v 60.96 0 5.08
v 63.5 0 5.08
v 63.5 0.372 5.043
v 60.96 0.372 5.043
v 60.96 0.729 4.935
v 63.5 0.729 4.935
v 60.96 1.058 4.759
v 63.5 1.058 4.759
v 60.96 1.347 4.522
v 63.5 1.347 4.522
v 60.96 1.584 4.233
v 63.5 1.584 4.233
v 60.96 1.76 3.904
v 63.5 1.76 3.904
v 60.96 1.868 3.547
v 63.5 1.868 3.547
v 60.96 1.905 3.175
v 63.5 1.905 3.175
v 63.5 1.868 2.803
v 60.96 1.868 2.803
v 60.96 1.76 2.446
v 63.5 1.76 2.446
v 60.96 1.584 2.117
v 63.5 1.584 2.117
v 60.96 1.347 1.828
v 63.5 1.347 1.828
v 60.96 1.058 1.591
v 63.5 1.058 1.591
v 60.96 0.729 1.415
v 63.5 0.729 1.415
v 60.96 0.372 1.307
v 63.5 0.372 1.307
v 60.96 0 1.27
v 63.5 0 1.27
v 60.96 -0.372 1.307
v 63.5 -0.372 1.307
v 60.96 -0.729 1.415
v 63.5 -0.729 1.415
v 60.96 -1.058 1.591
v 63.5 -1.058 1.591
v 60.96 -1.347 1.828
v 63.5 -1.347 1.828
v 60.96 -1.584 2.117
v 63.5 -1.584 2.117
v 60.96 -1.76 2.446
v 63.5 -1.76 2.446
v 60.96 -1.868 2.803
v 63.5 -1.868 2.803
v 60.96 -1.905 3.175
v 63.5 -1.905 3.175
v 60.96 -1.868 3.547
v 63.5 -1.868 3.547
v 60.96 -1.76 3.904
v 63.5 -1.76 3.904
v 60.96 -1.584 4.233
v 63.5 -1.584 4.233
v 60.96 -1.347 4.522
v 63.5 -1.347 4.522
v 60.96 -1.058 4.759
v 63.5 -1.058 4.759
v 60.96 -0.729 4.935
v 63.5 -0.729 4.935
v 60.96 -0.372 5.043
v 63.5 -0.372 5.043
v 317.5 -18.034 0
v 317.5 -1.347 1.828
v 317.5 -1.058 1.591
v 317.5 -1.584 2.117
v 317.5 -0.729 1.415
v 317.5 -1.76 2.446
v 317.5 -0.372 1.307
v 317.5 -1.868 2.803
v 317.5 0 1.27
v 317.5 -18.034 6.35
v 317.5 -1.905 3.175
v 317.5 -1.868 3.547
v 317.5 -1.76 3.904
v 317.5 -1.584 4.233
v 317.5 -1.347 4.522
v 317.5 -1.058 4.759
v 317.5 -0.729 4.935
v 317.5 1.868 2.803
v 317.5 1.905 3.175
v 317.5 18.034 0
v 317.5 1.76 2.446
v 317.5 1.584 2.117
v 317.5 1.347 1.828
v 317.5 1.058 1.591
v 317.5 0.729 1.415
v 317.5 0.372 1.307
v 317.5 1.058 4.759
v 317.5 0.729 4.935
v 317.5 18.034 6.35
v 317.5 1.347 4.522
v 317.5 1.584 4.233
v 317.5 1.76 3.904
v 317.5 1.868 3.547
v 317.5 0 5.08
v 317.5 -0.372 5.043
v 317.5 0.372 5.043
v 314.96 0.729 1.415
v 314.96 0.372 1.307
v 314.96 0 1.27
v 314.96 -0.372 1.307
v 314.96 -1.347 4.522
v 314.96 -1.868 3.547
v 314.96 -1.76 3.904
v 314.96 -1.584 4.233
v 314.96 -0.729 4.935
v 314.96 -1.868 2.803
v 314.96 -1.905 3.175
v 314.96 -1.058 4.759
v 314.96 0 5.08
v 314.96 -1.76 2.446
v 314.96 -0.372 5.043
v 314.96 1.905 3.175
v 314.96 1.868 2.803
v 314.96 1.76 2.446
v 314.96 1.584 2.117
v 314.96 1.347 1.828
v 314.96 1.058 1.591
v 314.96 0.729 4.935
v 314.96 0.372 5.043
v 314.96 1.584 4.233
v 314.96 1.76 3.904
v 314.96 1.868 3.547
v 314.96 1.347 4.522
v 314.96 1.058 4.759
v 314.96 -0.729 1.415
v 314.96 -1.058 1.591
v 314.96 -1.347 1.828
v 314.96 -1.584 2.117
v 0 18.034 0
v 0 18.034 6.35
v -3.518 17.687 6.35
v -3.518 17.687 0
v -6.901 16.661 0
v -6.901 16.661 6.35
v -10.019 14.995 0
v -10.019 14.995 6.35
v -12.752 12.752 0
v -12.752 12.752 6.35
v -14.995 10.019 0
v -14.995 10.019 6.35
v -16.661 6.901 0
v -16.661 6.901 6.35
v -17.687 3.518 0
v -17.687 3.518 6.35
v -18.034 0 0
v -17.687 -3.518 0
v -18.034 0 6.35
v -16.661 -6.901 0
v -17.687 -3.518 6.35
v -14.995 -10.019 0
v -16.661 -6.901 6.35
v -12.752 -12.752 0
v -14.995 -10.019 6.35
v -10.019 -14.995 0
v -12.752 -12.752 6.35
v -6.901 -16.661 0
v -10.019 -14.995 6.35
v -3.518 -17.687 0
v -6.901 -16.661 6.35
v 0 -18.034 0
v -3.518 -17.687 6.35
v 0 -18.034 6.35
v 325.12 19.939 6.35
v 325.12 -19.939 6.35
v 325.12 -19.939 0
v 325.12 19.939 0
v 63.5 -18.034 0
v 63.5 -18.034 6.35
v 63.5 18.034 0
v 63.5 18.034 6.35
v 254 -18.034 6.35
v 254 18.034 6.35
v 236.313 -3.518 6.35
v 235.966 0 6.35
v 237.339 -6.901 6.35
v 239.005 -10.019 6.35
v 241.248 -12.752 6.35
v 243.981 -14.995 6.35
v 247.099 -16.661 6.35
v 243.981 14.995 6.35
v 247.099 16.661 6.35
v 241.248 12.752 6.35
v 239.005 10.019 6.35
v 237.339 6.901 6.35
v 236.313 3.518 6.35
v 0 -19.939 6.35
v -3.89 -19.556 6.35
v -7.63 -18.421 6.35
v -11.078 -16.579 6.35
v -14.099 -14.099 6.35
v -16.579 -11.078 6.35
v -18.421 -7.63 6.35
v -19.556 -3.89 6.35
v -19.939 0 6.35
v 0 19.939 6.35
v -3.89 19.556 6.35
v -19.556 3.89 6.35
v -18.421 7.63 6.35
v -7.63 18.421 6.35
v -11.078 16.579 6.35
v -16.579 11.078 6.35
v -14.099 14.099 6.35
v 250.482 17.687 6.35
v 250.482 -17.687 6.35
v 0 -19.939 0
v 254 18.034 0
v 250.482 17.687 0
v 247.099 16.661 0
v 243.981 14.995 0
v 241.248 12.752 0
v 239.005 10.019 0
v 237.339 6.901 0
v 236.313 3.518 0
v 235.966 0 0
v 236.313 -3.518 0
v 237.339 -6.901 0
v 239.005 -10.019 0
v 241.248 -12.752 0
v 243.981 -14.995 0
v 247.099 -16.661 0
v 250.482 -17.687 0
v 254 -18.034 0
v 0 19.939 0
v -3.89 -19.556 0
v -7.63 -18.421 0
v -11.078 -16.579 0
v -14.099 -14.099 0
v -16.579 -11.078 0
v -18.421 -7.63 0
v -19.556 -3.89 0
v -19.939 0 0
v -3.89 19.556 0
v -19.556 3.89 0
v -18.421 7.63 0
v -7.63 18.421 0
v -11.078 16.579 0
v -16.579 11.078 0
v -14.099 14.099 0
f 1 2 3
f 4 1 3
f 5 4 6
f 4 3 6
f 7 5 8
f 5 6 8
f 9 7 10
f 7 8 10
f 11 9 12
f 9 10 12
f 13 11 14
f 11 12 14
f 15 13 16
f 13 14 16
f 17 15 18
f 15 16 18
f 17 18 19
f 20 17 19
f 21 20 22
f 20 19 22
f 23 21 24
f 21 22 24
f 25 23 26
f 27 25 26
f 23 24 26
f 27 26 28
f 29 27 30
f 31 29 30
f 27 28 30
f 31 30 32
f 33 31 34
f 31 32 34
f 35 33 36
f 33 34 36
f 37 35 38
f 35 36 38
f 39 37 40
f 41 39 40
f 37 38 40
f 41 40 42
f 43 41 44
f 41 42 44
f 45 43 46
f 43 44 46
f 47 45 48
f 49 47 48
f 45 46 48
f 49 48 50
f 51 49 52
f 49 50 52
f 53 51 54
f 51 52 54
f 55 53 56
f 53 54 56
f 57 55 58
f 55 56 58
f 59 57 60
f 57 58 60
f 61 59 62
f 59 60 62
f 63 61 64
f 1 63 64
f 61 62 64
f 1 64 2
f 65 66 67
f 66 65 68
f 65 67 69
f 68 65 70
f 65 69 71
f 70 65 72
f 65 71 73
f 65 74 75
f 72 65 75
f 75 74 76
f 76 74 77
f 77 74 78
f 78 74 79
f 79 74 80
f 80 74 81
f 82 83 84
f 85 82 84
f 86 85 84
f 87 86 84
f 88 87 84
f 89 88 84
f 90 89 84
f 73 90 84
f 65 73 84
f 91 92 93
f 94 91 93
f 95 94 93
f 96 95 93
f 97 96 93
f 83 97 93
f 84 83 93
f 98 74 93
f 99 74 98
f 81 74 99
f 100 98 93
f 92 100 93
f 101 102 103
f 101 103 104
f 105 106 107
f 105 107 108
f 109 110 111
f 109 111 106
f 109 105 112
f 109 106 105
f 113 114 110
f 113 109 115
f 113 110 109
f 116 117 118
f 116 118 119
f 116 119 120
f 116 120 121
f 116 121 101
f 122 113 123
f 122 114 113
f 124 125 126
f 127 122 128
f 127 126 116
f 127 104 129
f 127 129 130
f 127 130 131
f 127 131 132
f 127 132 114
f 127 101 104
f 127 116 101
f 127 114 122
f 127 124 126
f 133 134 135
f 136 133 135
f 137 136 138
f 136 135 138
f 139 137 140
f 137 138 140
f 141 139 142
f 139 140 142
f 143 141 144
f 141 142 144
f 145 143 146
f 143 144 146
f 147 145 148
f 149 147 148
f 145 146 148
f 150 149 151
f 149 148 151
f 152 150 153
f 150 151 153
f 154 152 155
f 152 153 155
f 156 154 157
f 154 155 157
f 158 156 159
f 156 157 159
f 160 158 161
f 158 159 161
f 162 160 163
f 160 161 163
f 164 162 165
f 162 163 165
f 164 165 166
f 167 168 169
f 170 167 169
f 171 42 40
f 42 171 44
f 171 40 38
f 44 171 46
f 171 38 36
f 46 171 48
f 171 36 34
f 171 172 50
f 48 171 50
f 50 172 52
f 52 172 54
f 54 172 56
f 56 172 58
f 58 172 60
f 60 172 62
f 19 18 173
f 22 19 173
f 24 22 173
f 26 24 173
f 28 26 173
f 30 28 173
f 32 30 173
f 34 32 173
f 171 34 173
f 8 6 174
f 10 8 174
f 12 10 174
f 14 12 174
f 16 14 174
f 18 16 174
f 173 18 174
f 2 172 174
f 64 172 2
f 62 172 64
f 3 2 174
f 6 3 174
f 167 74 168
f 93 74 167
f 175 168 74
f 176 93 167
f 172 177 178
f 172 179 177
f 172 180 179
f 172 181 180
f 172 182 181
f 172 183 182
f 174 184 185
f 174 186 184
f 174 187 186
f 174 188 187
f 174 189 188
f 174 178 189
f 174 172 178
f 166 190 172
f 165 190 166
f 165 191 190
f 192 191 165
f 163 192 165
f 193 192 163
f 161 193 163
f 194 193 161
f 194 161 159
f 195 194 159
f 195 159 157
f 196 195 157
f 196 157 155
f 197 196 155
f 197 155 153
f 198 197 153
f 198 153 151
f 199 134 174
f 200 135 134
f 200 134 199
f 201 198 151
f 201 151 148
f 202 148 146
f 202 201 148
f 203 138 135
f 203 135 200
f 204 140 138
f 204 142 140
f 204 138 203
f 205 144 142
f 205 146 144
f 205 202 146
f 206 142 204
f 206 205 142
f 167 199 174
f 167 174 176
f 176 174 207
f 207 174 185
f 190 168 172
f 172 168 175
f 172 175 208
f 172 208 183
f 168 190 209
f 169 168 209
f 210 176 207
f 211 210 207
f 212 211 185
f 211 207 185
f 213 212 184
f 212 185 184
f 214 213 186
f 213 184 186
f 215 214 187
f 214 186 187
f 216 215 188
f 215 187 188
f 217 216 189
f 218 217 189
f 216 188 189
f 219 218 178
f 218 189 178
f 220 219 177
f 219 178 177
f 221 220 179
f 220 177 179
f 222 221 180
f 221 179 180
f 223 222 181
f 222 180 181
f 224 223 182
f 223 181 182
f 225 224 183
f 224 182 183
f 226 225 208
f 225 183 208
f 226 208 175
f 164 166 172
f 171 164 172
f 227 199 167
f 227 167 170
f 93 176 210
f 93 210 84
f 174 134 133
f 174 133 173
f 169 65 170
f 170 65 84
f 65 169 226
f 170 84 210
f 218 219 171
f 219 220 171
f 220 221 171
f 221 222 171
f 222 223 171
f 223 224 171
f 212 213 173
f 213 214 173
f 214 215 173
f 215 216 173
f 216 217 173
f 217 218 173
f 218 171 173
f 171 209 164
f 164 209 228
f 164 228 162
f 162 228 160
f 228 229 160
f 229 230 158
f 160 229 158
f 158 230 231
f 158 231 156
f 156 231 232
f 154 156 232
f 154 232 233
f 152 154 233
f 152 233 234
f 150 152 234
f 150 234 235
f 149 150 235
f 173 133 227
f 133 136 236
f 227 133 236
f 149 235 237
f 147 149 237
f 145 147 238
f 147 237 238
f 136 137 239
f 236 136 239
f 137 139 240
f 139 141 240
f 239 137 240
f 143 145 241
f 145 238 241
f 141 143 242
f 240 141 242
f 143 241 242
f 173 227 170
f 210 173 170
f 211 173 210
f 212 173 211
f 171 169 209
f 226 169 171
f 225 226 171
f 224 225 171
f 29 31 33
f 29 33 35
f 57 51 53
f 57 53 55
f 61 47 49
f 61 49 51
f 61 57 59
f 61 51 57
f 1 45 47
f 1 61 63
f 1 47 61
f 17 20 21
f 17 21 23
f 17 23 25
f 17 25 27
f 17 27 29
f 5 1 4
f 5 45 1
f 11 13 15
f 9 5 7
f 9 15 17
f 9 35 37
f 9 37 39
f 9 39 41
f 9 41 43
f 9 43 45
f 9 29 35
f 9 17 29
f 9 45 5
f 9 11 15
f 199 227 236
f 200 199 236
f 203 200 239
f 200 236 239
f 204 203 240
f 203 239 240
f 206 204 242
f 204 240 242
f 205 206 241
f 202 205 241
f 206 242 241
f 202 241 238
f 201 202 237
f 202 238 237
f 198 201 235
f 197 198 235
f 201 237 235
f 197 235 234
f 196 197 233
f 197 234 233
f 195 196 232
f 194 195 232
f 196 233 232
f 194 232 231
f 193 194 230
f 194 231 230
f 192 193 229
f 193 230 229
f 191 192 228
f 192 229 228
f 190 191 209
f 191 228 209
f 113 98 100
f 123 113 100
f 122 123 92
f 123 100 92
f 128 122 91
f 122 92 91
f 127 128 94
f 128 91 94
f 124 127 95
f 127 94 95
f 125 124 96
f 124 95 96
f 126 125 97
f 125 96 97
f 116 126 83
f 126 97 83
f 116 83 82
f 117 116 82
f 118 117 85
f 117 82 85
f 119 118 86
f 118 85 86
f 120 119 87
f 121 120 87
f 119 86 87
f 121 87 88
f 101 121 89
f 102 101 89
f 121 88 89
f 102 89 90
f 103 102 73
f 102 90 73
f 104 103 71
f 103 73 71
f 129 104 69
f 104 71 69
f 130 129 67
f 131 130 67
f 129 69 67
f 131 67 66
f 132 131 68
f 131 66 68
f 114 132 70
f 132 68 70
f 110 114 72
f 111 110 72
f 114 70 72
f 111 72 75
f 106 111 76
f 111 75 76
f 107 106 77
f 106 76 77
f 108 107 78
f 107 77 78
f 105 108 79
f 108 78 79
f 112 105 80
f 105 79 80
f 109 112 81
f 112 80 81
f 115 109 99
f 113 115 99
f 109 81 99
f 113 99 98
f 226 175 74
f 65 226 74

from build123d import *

# Parameters (mm, degrees)
SKETCH1_R                = 19.939
CIRCLE_EXTRUDE_DEPTH     = 6.35
SKETCH3_W                = 6.35
SKETCH3_H                = 39.878
RECTANGLE_EXTRUDE_DEPTH  = 127
SKETCH2_R                = 18.034
CIRCLE_CUT_DEPTH         = 129.712416732
SKETCH6_W                = 125.095
SKETCH6_H                = 36.068
RECTANGLE_CUT_DEPTH      = 129.712416732
SKETCH7_W                = 61.595
SKETCH7_H                = 36.068
END_SHAPE_DEPTH          = 6.35
SKETCH8_R                = 1.905
FOR_SPRING_EXTRUDE_DEPTH = 2.54
MIRRORED_PATTERN_COUNT   = 2
MIRRORED_PATTERN_PITCH   = 254
MIDDLE_CONNECTOR_REACH   = 256.861
SKETCH10_W               = 6.35
SKETCH10_H               = 39.878
SKETCH11_W               = 6.35
SKETCH11_H               = 39.878
END_CUT_DEPTH            = 55.88


with BuildPart() as part:
    # Sketch1 → circle extrude (new body)
    with BuildSketch(Plane.XY):
        Circle(SKETCH1_R)
    extrude(amount=CIRCLE_EXTRUDE_DEPTH)

    # Sketch3 → rectangle extrude (add)
    with BuildSketch(Plane(origin=(0, 0, 0), x_dir=(0, 0, -1), z_dir=(1, 0, 0))):
        with Locations((-3.175, 0)):
            Rectangle(SKETCH3_W, SKETCH3_H)
    extrude(amount=RECTANGLE_EXTRUDE_DEPTH)

    # Sketch2 → circle cut (cut, through all)
    with BuildSketch(Plane.XY.offset(6.35)):
        Circle(SKETCH2_R)
    extrude(amount=-CIRCLE_CUT_DEPTH, mode=Mode.SUBTRACT)

    # Sketch6 → rectangle cut (cut, through all)
    with BuildSketch(Plane.XY.offset(6.35)):
        with Locations((62.5475, 0)):
            Rectangle(SKETCH6_W, SKETCH6_H)
    extrude(amount=-RECTANGLE_CUT_DEPTH, mode=Mode.SUBTRACT)

    # Sketch7 → end shape (add)
    with BuildSketch(Plane.XY.offset(6.35)):
        with Locations((94.2975, 0)):
            Rectangle(SKETCH7_W, SKETCH7_H)
    extrude(amount=-END_SHAPE_DEPTH)

    # Sketch8 → for spring extrude (add)
    with BuildSketch(Plane.ZY.offset(-63.5)):
        with Locations((3.175, 0)):
            Circle(SKETCH8_R)
    extrude(amount=FOR_SPRING_EXTRUDE_DEPTH)


with BuildPart() as mirrored_pattern_1:
    # mirrored pattern: pattern copy
    add(part.part.moved(Location(Vector(1, 0, 0) * (1 * MIRRORED_PATTERN_PITCH))))

    # Sketch10 → middle connector (add, up to next)
    with BuildSketch(Plane(origin=(127, 0, 0), x_dir=(0, 0, -1), z_dir=(1, 0, 0)), mode=Mode.PRIVATE) as middle_connector_sk1:
        with Locations((-3.175, 0)):
            Rectangle(SKETCH10_W, SKETCH10_H)
    middle_connector_tool1 = extrude(middle_connector_sk1.sketch, amount=MIDDLE_CONNECTOR_REACH, mode=Mode.PRIVATE) - mirrored_pattern_1.part

    add(part.part)  # middle connector merges part
    add(middle_connector_tool1.solids().sort_by_distance((127, 0, 3.175))[0])

    # Sketch11 → end cut (cut)
    with BuildSketch(Plane(origin=(381, 0, 0), x_dir=(0, 0, -1), z_dir=(1, 0, 0))):
        with Locations((-3.175, 0)):
            Rectangle(SKETCH11_W, SKETCH11_H)
    extrude(amount=-END_CUT_DEPTH, mode=Mode.SUBTRACT)


solid = mirrored_pattern_1.part
